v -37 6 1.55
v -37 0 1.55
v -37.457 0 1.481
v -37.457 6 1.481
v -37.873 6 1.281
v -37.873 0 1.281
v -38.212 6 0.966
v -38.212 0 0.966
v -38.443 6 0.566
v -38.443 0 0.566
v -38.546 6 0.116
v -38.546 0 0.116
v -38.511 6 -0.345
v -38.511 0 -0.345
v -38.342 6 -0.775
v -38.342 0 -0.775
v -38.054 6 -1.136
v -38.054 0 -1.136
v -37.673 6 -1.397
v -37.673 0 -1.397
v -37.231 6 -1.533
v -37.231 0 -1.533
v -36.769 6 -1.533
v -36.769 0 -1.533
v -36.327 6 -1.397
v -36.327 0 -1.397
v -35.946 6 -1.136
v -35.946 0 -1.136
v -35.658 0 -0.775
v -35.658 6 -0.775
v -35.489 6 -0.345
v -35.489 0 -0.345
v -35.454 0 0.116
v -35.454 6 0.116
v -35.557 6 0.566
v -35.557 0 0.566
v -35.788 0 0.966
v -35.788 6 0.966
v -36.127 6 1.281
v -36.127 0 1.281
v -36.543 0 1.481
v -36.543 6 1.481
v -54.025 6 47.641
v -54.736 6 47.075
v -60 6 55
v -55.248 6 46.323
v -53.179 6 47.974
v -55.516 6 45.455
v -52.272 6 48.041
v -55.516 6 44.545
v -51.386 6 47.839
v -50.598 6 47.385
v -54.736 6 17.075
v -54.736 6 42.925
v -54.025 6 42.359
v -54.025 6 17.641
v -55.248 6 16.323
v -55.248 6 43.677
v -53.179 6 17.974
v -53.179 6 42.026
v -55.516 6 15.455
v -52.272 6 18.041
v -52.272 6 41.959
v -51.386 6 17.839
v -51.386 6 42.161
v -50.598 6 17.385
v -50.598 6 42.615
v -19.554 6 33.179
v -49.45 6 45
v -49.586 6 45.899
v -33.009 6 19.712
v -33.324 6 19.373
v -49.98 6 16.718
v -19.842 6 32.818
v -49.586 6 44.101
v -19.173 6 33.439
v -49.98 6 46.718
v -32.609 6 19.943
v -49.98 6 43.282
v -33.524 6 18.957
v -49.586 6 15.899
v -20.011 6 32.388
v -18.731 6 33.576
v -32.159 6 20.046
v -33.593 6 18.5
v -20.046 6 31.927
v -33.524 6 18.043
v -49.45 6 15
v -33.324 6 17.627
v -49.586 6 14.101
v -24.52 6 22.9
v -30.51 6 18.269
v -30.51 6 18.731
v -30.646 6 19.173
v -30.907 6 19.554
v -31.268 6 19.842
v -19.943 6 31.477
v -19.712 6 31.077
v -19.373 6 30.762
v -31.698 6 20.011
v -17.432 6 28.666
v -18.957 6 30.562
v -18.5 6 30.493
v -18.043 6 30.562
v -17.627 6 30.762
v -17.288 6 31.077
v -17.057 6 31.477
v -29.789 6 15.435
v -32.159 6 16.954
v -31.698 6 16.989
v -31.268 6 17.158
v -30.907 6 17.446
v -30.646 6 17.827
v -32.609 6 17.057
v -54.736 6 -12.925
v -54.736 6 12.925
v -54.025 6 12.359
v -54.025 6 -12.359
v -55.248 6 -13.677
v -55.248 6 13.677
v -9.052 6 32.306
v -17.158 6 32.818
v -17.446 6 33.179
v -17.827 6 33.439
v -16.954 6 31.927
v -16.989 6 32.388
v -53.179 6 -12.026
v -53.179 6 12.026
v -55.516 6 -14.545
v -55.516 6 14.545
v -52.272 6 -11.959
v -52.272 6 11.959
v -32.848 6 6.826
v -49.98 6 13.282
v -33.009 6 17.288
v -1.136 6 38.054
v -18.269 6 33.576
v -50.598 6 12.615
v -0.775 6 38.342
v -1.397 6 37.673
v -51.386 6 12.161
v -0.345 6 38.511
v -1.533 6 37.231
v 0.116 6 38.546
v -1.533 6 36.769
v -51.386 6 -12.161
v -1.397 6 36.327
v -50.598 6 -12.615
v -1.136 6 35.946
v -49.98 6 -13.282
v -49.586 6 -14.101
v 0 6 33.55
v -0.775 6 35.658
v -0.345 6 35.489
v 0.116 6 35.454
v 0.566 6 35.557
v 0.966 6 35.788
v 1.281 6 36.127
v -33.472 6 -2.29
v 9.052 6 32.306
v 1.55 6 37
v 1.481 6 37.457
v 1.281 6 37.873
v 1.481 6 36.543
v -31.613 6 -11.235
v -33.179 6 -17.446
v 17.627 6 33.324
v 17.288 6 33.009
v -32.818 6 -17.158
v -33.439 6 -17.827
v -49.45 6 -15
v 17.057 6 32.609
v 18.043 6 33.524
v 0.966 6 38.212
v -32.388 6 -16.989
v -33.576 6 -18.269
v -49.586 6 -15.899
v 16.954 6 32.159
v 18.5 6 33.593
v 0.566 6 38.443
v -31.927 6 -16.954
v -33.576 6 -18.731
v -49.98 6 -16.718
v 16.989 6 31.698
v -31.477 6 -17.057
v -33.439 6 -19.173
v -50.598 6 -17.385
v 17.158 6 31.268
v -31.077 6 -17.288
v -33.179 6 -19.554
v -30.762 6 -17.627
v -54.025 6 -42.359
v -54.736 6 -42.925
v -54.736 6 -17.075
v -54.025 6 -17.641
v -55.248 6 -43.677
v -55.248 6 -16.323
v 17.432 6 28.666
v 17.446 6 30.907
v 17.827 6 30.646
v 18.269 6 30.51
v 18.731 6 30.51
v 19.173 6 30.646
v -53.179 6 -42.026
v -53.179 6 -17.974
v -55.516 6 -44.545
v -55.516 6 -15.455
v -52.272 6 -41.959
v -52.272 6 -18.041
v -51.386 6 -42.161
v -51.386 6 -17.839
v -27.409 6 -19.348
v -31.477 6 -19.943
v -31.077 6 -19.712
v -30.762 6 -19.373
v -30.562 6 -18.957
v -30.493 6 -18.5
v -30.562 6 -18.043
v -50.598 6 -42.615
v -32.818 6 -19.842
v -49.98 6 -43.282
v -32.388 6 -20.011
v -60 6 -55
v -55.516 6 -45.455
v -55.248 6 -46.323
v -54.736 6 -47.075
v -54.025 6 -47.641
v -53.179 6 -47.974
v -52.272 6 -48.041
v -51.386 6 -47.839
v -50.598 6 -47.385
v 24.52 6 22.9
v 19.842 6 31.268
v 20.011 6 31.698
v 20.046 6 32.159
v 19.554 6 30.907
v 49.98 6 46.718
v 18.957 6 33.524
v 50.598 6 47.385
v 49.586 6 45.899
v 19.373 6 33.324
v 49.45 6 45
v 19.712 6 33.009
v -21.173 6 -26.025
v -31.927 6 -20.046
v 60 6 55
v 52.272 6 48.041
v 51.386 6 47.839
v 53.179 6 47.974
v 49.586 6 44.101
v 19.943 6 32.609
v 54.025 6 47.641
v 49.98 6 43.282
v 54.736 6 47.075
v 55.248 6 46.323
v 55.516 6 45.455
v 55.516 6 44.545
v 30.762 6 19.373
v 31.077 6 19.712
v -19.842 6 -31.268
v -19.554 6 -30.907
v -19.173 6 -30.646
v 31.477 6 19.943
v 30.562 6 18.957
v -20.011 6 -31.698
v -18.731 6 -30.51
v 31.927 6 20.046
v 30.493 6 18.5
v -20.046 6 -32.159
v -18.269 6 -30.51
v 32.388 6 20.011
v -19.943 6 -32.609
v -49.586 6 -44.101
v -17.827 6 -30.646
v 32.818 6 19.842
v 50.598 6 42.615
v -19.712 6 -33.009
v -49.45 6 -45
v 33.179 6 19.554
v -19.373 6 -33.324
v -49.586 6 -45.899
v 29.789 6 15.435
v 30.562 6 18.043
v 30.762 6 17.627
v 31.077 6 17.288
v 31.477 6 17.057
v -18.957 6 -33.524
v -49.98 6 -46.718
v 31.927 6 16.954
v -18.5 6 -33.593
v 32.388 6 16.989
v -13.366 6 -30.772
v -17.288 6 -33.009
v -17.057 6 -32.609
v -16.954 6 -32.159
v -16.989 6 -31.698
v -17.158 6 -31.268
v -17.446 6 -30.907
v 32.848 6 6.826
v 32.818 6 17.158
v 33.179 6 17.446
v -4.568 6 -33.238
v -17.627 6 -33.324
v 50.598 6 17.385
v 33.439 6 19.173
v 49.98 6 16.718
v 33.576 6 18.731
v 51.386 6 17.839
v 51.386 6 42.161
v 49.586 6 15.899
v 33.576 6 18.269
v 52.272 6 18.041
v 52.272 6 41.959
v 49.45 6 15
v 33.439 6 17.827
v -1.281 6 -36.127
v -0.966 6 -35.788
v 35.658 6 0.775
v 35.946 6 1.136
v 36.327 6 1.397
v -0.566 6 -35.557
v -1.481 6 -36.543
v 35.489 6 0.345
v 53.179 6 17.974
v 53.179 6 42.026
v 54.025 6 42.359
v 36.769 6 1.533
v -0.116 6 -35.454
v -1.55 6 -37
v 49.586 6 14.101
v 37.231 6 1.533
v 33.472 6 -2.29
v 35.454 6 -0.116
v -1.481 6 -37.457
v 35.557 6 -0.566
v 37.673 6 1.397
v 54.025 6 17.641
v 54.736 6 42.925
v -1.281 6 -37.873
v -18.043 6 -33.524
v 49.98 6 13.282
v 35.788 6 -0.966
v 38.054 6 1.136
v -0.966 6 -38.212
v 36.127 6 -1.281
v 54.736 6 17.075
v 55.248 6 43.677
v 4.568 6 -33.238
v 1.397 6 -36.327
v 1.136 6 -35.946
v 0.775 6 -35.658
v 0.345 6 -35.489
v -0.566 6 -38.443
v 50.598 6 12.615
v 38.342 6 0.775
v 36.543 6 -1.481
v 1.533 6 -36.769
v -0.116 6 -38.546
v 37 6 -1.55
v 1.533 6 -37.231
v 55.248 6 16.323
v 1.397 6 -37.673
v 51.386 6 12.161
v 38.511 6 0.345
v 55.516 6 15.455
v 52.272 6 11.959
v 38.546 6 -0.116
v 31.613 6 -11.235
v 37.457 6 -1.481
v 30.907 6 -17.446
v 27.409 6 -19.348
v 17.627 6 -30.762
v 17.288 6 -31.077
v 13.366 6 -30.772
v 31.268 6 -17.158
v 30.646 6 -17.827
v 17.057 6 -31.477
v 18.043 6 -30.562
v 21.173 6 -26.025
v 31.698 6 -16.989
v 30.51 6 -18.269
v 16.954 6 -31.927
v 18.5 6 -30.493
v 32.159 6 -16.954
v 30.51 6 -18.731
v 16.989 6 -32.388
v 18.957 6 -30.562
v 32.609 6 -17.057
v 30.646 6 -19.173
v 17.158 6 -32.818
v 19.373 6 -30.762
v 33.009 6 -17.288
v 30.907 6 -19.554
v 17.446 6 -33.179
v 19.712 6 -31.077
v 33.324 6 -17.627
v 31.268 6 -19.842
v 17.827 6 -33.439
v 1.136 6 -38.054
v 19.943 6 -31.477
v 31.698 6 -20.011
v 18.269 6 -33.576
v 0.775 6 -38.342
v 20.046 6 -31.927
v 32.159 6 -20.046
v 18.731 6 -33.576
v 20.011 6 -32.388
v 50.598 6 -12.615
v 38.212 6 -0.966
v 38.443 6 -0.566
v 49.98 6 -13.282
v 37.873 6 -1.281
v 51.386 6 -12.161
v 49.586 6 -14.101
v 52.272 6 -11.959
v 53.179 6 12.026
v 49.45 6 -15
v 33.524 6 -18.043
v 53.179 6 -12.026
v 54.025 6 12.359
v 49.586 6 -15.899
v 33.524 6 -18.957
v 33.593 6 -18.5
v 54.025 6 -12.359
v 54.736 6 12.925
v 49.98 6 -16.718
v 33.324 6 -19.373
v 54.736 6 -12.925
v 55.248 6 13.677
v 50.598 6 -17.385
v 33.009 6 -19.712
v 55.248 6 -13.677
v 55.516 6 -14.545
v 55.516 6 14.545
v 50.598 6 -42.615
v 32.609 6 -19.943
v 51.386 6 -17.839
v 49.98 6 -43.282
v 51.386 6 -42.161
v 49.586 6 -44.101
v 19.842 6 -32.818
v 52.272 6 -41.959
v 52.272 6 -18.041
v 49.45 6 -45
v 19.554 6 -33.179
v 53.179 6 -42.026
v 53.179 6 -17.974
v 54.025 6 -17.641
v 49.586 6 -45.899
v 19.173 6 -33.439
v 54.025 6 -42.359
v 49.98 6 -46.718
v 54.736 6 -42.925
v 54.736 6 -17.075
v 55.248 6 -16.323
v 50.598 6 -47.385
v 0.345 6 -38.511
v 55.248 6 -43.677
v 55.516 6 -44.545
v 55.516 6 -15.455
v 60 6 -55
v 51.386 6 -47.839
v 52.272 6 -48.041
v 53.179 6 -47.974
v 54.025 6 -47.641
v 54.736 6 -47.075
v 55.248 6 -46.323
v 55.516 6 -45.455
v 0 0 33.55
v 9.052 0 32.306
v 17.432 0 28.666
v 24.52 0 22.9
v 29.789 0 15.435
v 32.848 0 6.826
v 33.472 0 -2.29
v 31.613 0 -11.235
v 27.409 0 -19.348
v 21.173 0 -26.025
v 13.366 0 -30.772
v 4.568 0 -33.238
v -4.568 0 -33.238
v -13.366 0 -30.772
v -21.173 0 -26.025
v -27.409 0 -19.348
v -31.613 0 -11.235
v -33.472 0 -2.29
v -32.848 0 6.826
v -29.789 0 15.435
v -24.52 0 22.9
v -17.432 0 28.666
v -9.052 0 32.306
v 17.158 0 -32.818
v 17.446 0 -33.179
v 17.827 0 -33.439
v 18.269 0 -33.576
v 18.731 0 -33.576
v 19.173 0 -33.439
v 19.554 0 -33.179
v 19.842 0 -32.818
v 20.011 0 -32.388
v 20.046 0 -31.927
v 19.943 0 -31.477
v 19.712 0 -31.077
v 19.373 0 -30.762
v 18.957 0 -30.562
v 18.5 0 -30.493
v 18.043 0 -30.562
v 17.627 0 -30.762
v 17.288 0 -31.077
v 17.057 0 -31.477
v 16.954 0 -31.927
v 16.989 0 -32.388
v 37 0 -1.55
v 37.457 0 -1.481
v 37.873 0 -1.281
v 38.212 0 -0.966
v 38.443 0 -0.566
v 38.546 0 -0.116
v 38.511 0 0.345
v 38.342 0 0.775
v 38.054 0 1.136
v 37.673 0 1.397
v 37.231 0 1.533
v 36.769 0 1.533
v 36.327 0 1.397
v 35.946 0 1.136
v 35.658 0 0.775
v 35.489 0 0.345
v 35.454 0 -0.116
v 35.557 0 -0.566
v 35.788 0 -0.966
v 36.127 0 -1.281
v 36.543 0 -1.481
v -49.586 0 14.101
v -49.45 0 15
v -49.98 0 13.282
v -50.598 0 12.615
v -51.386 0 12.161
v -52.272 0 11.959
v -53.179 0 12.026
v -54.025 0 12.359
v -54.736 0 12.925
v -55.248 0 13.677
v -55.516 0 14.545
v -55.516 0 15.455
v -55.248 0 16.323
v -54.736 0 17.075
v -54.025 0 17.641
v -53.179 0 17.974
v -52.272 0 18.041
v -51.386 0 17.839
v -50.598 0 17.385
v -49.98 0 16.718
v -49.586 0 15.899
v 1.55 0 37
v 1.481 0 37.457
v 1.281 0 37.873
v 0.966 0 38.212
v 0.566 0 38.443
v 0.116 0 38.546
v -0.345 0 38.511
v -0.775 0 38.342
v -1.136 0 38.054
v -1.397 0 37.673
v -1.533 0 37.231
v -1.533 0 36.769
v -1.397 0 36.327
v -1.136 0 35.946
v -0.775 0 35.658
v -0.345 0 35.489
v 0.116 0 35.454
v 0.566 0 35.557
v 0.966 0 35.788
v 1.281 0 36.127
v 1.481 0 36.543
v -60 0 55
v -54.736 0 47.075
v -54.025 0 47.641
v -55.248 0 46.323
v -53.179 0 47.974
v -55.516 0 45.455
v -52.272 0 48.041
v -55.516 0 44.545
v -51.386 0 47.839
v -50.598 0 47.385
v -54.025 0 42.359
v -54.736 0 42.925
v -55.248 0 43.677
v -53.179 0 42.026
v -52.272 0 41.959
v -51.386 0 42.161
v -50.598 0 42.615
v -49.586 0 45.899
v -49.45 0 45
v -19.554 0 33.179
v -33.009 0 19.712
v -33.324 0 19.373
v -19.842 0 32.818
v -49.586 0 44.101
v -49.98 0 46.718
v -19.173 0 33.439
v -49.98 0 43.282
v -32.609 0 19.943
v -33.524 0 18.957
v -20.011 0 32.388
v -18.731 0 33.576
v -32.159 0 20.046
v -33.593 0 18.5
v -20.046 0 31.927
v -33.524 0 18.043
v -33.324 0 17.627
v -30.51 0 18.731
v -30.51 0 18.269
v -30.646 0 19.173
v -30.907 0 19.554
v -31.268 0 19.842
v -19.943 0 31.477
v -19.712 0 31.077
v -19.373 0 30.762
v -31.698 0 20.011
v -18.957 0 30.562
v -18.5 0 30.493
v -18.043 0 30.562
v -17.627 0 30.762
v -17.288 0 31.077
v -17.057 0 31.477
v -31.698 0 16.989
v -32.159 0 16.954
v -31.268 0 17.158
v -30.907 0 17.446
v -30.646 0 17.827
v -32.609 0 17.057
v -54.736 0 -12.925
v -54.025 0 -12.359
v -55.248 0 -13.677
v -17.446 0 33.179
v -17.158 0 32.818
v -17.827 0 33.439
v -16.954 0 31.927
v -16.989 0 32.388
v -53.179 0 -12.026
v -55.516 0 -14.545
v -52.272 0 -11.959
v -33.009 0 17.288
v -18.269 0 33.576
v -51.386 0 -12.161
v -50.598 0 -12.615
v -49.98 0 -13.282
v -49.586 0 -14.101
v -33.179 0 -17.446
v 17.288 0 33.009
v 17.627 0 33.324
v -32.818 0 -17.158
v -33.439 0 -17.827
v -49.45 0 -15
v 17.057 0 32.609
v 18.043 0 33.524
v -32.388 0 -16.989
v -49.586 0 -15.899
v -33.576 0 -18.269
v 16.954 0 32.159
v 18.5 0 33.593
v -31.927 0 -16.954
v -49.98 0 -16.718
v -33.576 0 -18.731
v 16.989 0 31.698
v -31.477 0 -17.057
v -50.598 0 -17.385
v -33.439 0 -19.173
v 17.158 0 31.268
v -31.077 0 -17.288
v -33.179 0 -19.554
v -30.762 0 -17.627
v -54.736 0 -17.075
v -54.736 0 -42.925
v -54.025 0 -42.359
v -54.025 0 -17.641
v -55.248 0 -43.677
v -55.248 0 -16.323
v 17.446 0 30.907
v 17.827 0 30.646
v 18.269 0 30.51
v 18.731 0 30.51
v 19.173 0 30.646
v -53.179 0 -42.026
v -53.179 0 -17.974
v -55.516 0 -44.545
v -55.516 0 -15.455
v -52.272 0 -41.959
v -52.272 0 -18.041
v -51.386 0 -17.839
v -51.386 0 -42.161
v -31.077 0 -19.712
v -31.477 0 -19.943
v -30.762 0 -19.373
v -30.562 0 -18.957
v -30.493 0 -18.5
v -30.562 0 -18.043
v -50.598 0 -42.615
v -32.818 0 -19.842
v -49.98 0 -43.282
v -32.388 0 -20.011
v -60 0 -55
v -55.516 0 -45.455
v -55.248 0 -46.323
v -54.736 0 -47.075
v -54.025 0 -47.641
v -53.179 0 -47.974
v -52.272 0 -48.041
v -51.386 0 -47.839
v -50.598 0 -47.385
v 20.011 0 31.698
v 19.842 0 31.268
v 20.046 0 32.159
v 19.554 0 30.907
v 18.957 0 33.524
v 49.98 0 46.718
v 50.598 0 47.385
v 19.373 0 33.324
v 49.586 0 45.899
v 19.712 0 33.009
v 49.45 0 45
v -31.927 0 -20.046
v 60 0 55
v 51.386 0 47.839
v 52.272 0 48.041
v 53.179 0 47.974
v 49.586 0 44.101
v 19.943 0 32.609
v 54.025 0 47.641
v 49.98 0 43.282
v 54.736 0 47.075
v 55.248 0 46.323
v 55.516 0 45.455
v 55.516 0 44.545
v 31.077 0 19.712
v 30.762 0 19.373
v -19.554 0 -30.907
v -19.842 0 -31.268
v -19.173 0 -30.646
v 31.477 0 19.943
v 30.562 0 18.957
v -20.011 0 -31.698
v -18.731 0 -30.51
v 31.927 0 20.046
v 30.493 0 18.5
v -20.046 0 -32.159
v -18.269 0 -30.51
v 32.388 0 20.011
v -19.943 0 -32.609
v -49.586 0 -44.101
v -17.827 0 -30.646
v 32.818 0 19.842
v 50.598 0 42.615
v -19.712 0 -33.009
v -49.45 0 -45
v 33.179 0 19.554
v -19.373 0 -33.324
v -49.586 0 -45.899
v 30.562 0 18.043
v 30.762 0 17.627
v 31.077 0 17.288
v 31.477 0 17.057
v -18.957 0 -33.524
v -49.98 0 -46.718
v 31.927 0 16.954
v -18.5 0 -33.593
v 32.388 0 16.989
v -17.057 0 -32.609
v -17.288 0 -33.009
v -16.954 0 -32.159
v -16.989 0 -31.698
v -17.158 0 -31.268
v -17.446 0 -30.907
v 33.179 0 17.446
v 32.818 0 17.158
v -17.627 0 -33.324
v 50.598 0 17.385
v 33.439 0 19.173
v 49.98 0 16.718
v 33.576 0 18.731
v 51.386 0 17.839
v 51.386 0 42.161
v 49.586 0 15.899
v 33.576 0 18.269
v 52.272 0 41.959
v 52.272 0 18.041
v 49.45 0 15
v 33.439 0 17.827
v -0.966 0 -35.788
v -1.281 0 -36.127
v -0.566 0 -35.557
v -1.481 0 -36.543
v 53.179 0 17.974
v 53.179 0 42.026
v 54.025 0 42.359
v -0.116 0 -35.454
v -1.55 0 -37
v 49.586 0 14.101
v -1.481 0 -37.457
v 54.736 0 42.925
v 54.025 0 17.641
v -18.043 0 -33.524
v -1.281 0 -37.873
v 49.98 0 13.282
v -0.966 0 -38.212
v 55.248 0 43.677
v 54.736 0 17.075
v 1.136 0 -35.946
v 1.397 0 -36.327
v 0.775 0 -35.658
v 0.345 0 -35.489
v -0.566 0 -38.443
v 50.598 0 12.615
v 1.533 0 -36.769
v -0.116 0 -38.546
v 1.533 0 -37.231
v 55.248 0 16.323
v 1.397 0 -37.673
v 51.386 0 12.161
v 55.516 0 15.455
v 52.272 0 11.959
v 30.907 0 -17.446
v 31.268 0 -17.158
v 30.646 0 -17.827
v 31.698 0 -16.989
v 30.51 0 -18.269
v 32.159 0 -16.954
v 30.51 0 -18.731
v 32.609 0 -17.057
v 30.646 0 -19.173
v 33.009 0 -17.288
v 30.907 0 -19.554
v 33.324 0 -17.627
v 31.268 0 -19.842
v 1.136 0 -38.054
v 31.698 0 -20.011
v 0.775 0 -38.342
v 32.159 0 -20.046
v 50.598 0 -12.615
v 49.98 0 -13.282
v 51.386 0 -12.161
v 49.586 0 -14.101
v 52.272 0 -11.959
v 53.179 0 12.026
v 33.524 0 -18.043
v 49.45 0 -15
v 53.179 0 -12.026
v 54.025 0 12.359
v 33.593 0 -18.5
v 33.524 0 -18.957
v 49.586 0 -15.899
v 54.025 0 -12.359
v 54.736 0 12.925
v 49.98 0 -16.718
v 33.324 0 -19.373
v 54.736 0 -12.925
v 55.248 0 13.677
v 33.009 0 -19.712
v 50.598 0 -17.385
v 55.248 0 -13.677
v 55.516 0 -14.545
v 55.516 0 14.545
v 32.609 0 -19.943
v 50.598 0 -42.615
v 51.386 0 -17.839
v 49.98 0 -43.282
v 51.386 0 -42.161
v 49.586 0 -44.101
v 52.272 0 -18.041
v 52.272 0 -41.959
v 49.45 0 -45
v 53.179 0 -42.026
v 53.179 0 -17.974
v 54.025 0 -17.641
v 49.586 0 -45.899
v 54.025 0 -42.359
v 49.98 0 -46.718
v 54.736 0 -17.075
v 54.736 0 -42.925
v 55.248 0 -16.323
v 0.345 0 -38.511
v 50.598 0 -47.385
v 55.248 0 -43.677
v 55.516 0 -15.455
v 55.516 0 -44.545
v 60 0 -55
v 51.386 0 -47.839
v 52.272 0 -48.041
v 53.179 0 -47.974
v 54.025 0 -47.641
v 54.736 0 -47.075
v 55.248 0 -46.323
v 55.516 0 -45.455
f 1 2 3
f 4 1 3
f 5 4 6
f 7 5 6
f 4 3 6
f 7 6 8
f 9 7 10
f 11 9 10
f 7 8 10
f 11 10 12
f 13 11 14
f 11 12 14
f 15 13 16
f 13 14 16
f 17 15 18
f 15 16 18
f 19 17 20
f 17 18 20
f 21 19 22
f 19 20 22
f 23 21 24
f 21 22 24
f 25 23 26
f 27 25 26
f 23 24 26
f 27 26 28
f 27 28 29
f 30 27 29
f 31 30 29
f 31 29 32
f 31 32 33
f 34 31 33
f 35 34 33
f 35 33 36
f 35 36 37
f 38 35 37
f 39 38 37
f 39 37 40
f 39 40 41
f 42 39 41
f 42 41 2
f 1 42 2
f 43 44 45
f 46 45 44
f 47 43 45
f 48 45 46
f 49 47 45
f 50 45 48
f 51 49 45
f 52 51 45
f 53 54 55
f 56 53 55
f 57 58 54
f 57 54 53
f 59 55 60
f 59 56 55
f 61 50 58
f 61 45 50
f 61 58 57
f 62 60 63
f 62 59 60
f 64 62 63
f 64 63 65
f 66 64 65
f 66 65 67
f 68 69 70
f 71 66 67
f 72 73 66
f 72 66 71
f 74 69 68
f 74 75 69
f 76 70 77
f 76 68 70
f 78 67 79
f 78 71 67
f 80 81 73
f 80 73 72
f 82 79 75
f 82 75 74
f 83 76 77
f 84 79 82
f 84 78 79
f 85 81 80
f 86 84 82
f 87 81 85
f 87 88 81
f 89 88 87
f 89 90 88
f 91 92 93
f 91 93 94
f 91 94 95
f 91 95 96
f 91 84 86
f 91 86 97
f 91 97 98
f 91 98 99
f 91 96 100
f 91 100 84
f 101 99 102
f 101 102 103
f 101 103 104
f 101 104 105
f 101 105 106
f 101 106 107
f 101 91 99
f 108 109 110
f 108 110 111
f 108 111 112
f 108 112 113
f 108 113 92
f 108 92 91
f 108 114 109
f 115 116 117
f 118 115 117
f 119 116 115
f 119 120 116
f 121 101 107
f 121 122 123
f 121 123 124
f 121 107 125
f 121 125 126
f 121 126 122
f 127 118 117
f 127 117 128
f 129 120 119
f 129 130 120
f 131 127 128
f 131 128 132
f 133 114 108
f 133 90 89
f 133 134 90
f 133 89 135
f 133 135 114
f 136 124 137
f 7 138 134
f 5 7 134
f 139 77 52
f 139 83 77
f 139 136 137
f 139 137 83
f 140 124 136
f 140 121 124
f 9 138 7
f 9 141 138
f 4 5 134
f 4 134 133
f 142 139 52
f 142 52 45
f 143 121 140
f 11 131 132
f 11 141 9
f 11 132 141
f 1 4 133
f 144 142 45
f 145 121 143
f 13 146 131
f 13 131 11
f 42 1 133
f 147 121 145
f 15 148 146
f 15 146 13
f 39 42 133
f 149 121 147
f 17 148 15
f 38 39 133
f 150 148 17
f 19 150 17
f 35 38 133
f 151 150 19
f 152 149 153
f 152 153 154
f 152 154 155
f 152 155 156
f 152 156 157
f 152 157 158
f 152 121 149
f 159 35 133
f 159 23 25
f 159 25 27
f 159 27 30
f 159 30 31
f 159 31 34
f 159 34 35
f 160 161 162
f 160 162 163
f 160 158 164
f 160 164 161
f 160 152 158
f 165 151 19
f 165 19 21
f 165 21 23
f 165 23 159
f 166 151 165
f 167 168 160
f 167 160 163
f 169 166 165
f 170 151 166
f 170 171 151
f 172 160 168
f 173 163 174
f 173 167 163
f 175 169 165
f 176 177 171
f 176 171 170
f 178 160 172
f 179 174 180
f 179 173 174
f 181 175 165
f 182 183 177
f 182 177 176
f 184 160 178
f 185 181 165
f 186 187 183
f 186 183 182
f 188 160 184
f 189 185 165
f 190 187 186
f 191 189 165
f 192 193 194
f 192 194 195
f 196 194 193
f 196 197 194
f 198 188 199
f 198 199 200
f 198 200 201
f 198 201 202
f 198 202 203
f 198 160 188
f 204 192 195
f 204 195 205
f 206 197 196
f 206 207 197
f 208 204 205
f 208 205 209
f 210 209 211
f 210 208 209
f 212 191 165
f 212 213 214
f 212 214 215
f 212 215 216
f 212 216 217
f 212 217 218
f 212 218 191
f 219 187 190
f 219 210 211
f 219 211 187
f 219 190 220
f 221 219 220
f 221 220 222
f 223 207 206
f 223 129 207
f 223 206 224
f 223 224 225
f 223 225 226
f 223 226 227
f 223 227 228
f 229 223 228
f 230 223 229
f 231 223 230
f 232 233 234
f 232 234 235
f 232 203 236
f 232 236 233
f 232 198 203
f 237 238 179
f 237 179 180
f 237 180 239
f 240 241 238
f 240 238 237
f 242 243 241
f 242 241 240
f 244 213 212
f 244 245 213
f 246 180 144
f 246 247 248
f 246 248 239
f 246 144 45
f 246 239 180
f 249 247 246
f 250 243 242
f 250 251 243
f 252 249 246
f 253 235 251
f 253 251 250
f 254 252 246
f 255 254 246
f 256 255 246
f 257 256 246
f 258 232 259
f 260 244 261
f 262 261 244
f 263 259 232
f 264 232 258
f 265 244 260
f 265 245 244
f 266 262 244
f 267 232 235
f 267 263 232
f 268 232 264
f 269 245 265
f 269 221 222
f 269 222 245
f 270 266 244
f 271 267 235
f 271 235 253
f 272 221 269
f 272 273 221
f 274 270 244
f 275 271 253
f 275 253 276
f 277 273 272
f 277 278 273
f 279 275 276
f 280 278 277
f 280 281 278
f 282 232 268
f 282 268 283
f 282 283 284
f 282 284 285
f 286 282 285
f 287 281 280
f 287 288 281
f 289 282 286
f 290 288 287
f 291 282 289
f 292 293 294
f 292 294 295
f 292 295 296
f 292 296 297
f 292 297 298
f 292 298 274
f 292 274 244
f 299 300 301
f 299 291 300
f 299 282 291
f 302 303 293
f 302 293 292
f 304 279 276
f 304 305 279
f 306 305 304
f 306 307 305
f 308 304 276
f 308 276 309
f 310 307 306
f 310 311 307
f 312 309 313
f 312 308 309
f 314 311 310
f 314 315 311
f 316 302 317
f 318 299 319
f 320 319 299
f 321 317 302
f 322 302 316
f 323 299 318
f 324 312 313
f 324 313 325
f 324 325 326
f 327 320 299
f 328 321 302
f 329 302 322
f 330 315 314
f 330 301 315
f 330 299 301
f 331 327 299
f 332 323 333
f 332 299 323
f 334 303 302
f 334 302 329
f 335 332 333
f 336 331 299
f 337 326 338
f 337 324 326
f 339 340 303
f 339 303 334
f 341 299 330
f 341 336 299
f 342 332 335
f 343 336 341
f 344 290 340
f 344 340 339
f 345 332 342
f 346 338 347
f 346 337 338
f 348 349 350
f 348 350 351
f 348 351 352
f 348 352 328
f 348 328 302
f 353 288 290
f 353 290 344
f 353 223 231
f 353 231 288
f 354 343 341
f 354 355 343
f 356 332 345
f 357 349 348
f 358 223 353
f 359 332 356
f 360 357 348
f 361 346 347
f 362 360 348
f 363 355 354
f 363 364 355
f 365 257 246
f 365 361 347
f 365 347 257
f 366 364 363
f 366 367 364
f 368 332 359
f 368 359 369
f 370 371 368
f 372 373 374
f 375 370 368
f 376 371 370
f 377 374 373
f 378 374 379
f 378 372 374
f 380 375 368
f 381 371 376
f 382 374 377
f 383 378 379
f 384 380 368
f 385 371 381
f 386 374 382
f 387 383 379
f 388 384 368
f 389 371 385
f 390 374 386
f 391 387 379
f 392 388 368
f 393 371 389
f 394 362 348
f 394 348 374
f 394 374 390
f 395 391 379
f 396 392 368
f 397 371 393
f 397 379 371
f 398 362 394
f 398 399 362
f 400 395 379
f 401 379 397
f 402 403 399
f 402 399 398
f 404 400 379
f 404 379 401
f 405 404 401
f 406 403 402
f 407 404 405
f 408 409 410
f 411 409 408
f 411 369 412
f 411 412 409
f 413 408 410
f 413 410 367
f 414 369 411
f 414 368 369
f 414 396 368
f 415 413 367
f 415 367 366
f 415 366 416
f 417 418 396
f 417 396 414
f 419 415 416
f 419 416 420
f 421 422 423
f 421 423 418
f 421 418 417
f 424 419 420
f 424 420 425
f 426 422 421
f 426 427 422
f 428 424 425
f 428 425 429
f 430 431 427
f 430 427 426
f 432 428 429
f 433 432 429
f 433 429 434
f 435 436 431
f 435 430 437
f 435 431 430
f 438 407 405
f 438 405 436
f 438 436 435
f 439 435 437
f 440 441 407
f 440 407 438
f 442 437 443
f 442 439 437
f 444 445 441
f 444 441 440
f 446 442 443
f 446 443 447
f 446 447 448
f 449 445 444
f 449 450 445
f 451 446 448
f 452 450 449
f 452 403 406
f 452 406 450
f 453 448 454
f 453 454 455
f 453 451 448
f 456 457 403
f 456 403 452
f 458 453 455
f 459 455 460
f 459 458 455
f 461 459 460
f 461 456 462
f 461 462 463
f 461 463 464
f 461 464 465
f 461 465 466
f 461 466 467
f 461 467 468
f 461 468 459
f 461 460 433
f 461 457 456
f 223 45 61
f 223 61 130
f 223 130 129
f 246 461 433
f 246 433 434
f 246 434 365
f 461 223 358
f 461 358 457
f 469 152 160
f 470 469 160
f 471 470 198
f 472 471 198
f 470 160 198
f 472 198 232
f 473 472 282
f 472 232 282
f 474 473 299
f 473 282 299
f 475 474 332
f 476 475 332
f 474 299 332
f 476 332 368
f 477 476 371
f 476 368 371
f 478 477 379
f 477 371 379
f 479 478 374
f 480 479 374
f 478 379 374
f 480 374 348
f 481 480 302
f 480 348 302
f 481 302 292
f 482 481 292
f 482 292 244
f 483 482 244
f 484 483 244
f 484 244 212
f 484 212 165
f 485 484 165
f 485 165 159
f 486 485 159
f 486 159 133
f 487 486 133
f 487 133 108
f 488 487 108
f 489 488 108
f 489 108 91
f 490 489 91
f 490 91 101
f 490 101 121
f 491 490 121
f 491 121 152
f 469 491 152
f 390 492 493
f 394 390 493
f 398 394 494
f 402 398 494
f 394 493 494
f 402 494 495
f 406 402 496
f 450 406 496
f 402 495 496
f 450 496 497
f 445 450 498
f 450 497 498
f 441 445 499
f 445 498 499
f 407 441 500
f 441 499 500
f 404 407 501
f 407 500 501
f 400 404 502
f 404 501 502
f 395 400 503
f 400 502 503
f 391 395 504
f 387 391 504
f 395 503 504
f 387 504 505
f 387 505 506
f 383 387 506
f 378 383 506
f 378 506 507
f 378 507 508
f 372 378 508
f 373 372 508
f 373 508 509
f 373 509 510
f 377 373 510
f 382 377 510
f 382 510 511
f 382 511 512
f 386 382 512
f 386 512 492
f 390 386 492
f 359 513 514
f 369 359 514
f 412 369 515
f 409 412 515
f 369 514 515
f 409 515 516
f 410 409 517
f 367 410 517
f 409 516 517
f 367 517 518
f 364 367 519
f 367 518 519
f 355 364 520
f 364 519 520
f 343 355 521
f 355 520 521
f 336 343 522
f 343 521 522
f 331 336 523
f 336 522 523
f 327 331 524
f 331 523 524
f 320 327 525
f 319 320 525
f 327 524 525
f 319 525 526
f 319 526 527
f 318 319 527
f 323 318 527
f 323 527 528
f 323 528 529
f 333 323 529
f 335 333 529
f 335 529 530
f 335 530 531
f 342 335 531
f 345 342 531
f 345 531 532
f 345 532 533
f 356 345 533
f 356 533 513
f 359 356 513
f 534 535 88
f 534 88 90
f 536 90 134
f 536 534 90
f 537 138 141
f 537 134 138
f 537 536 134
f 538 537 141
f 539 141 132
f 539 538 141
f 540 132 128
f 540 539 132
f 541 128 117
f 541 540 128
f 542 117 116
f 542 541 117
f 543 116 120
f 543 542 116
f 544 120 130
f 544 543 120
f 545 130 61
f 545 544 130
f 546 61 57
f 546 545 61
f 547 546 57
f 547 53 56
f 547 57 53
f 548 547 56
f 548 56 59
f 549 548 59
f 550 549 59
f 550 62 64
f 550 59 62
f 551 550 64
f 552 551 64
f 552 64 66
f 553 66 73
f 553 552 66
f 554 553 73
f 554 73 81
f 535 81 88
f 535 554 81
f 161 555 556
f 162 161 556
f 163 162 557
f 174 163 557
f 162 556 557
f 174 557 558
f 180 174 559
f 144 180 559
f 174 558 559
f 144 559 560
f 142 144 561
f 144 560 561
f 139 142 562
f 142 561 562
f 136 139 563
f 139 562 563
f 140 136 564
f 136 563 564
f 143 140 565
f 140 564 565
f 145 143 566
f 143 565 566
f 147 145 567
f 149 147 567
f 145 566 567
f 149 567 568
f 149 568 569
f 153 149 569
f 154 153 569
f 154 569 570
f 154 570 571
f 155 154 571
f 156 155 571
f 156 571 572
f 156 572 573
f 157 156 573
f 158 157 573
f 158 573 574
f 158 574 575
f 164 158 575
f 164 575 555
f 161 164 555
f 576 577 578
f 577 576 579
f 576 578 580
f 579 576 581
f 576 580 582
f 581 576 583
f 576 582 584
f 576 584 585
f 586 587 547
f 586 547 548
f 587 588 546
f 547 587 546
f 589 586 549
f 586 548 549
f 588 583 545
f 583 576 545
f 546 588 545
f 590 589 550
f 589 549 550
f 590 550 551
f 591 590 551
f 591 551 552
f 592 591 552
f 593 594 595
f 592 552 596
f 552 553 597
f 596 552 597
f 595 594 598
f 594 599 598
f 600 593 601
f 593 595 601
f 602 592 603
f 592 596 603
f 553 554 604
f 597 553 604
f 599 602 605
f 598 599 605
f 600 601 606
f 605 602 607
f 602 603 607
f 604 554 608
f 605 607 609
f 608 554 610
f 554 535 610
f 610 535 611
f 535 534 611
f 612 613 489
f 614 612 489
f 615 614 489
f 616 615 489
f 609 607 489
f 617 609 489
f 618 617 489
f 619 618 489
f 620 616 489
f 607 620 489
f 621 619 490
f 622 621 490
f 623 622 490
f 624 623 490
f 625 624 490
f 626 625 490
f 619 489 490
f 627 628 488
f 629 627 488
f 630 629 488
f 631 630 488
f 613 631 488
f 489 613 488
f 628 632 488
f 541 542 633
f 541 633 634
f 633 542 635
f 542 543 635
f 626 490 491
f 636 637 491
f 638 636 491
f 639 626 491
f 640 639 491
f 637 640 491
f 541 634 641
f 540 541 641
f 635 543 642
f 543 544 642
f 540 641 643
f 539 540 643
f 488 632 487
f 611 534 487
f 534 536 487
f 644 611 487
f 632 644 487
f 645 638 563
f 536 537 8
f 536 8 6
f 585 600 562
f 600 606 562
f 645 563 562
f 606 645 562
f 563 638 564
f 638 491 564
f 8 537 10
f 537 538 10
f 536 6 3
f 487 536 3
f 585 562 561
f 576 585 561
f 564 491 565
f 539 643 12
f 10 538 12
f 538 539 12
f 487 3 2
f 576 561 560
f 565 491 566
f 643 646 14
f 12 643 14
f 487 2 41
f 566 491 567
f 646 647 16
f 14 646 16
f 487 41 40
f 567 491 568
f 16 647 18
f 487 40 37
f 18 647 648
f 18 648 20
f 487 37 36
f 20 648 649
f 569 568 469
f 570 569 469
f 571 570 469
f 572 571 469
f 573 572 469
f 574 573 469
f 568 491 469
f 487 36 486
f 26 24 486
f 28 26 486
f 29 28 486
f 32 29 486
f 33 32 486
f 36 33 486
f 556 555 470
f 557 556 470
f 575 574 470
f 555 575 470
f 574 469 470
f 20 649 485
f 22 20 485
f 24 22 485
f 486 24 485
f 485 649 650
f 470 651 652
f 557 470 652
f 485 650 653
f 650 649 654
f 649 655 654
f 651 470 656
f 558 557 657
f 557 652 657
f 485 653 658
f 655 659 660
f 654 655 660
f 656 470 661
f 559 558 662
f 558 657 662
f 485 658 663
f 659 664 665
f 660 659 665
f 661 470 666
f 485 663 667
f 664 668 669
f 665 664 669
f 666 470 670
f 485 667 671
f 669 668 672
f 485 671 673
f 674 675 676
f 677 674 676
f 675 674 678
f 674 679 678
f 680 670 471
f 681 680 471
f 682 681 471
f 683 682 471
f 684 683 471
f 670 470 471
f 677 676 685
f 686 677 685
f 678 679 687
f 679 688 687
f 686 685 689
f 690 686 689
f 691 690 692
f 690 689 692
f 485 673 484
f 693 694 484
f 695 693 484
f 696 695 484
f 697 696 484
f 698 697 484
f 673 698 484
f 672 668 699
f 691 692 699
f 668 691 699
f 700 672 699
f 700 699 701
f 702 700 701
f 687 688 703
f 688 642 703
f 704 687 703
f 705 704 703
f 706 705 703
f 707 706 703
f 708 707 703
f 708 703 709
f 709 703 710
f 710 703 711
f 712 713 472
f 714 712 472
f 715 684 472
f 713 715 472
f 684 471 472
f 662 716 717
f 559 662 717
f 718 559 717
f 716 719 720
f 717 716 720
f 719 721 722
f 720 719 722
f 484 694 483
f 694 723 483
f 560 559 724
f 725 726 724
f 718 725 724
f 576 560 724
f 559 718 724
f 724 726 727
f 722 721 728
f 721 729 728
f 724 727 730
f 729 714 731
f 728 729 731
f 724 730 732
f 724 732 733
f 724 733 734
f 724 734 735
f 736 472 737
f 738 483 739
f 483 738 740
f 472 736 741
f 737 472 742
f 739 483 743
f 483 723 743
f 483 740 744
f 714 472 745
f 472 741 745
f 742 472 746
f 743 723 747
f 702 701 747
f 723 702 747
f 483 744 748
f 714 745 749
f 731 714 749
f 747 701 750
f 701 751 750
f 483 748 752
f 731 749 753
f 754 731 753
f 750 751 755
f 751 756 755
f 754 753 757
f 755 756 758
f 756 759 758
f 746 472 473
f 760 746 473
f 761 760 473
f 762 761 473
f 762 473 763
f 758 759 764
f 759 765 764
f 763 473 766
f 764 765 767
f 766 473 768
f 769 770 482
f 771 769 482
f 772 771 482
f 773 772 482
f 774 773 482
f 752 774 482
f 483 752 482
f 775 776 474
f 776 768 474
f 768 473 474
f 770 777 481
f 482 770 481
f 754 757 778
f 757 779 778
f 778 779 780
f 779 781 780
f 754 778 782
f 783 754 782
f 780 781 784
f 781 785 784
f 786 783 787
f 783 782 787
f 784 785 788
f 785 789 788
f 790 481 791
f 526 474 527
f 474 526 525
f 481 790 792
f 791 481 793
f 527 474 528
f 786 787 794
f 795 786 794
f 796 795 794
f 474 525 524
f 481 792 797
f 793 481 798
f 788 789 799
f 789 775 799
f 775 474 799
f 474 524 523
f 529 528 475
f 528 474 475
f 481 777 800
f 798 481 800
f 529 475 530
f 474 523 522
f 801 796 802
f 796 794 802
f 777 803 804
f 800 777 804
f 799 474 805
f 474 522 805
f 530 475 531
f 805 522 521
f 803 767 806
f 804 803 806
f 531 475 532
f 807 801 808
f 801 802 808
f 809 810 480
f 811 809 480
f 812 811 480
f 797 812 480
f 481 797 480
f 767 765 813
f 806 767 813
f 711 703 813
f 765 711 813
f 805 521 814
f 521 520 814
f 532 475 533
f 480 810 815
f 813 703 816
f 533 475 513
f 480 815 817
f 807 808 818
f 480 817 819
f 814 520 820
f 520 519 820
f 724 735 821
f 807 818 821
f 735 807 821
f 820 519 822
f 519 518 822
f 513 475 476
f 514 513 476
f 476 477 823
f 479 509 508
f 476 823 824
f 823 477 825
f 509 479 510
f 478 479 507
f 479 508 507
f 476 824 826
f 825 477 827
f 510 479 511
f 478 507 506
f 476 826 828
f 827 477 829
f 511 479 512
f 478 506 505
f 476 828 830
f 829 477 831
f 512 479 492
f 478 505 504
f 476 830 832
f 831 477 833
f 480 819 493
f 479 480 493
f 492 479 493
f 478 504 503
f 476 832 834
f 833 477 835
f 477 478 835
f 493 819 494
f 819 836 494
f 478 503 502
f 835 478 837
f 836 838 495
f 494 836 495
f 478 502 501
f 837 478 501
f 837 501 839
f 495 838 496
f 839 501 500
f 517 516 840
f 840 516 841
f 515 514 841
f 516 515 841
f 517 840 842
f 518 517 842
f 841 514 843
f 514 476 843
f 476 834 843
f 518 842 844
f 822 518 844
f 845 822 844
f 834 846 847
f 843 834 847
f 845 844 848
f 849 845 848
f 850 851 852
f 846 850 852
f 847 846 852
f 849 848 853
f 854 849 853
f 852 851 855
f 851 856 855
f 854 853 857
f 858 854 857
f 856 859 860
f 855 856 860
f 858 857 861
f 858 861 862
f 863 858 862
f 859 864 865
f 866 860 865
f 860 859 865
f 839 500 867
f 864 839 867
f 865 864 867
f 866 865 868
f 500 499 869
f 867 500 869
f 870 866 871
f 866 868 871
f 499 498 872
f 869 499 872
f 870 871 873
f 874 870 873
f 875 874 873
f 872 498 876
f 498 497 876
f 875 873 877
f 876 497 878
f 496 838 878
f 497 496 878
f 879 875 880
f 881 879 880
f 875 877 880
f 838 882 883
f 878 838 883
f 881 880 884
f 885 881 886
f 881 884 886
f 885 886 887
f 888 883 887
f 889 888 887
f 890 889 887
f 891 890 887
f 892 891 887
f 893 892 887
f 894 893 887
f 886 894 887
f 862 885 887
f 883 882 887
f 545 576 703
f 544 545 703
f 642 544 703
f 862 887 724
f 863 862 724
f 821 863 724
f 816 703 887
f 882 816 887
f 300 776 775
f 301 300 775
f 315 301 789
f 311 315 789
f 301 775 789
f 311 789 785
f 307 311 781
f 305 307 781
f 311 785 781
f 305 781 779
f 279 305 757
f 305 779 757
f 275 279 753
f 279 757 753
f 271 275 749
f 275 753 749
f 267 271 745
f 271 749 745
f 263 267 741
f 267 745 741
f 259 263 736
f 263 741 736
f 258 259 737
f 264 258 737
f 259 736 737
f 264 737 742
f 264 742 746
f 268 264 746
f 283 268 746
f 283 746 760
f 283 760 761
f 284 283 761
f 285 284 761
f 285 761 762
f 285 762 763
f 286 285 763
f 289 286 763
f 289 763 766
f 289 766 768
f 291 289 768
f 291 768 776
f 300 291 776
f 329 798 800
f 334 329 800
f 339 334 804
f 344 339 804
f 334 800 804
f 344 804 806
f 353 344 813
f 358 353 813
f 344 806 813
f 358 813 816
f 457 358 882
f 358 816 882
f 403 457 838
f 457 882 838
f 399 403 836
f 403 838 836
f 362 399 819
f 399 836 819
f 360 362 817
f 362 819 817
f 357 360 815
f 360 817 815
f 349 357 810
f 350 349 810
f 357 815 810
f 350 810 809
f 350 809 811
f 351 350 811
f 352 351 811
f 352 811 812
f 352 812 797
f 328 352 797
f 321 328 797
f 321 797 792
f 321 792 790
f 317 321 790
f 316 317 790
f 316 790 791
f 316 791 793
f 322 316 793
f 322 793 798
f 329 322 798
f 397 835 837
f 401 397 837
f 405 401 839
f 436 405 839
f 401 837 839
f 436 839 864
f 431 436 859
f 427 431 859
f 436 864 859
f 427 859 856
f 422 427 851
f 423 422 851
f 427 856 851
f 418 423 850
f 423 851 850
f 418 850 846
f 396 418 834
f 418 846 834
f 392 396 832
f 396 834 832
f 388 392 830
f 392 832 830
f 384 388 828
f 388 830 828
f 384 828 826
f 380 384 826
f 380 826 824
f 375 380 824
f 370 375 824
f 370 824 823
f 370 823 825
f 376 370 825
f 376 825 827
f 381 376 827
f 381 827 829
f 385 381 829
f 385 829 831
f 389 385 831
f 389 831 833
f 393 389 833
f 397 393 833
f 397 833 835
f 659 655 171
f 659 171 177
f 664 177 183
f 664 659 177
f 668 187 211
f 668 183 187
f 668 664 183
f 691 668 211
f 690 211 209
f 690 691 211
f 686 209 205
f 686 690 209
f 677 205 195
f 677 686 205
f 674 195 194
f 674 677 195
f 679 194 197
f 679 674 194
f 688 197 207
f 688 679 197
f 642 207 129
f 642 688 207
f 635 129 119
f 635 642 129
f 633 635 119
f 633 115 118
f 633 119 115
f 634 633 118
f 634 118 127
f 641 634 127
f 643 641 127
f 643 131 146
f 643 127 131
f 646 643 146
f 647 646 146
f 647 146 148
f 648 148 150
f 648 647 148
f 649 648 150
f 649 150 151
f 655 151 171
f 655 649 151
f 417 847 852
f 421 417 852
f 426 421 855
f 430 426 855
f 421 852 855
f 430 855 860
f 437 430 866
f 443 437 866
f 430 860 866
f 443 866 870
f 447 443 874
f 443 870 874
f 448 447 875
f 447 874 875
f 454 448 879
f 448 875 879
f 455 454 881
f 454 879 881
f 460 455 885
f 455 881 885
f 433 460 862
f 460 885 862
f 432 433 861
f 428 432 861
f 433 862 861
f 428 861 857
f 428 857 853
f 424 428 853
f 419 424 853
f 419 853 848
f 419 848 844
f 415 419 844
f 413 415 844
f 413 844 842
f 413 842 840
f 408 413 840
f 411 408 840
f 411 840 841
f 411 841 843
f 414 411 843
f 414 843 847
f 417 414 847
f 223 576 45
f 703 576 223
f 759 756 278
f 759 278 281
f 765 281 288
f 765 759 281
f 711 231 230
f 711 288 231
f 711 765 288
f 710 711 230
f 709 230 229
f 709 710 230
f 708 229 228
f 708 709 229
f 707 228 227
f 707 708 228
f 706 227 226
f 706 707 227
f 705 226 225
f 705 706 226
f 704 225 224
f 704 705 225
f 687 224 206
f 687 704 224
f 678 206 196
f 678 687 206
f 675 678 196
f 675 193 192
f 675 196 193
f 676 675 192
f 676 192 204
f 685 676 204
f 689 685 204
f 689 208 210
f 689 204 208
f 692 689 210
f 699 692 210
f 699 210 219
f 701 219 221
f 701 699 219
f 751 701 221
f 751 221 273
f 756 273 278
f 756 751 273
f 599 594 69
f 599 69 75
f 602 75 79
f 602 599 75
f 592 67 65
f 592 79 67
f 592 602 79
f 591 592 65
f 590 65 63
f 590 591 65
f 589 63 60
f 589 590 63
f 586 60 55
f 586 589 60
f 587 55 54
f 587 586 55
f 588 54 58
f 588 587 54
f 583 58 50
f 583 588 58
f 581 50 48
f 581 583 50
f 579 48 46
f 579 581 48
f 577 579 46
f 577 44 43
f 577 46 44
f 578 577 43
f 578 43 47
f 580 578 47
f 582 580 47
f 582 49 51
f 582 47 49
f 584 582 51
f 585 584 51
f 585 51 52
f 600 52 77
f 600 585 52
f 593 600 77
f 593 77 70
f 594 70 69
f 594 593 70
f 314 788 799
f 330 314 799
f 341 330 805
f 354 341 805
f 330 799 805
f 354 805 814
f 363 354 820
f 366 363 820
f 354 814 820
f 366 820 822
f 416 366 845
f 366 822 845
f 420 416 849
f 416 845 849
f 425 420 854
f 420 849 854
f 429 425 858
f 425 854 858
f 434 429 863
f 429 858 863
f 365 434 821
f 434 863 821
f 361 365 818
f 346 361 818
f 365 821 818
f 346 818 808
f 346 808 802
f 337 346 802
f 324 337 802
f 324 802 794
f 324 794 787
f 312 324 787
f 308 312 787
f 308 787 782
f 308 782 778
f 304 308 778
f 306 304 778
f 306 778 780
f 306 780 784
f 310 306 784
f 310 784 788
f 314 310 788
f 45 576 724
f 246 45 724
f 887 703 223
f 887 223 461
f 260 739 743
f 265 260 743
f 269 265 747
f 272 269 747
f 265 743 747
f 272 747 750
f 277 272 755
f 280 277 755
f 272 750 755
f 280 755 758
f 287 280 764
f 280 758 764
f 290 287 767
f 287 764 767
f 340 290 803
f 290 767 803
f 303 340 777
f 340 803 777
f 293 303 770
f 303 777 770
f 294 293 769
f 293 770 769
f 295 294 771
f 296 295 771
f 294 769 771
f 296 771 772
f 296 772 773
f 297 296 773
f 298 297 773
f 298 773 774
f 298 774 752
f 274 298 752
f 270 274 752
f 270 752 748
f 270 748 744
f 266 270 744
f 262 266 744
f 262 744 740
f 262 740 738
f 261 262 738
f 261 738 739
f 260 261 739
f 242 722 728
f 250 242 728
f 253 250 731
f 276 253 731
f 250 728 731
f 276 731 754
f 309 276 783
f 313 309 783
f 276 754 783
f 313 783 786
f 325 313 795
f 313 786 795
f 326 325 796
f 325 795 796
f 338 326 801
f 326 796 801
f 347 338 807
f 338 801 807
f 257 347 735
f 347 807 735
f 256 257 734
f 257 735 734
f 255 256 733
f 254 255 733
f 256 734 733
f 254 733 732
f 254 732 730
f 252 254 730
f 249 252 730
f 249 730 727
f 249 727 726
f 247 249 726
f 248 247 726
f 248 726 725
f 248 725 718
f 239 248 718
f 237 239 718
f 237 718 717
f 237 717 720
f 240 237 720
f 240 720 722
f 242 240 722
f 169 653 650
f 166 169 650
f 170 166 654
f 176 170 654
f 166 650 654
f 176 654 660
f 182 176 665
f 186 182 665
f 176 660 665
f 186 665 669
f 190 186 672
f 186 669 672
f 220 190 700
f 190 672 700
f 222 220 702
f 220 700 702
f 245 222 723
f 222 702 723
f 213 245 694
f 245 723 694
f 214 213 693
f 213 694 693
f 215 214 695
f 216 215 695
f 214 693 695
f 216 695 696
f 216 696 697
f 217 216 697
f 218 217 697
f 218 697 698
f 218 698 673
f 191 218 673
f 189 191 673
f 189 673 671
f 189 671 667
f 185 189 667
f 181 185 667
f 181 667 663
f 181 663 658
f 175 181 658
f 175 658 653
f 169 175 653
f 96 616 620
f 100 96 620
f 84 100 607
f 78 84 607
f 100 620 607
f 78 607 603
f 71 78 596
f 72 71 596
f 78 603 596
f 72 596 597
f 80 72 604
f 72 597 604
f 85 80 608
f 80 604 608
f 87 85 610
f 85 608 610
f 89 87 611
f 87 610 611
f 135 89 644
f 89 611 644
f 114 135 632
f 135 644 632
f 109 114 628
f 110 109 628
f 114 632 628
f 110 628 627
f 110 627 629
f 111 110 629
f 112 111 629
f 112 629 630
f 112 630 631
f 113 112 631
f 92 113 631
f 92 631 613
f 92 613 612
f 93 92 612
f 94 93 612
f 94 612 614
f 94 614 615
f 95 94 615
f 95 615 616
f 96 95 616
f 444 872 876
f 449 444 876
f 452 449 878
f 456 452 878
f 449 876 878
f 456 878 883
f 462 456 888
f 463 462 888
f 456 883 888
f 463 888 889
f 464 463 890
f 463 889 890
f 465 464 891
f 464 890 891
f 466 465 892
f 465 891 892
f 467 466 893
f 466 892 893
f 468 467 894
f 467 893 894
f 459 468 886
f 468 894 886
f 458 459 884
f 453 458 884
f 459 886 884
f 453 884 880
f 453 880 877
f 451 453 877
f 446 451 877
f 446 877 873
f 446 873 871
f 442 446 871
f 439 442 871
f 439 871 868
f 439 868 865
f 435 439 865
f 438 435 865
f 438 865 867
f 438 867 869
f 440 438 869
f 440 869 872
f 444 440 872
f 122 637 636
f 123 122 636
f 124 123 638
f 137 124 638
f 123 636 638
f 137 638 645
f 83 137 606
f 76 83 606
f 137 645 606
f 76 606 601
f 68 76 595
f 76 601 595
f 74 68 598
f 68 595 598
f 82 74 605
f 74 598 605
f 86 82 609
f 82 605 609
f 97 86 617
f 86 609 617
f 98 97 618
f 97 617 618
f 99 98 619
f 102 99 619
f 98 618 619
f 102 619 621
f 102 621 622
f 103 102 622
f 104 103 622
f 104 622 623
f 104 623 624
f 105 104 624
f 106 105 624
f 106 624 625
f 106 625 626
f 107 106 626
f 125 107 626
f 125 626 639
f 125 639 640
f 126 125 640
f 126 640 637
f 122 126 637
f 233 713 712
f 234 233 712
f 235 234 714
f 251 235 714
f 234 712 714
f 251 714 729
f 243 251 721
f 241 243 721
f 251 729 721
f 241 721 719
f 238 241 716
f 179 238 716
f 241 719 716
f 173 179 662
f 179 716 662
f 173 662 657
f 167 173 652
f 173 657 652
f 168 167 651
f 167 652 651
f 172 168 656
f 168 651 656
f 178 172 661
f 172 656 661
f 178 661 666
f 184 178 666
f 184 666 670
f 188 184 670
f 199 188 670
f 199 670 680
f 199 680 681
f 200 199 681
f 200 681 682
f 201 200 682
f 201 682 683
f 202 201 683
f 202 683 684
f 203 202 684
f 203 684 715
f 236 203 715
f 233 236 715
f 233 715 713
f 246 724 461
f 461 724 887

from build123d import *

# Parameters (mm, degrees)
SKETCH1_W            = 120
SKETCH1_H            = 110
BOSS_EXTRUDE1_DEPTH  = 6
SKETCH2_R            = 33.55
CUT_EXTRUDE1_DEPTH   = 82.614949611
M3_CLEARANCE_HOLE1_D = 3.1
CIRPATTERN1_COUNT    = 12
M6_CLEARANCE_HOLE2_D = 6.1


with BuildPart() as part:
    # Sketch1 → Boss-Extrude1 (new body)
    with BuildSketch(Plane(origin=(0, 0, 0), x_dir=(1, 0, 0), z_dir=(0, 1, 0))):
        Rectangle(SKETCH1_W, SKETCH1_H)
    extrude(amount=BOSS_EXTRUDE1_DEPTH)

    # Sketch2 → Cut-Extrude1 (cut, through all)
    with BuildSketch(Plane(origin=(0, 6, 0), x_dir=(1, 0, 0), z_dir=(0, 1, 0))):
        with Locations(Location((0, 0, 0), (0, 0, 270))):
            Circle(SKETCH2_R)
    extrude(amount=-CUT_EXTRUDE1_DEPTH, mode=Mode.SUBTRACT)

    # M3 Clearance Hole1 (through all)
    with Locations(Plane(origin=(0, 6, 0), x_dir=(1, 0, 0), z_dir=(0, 1, 0))):
        with Locations((0, 37)):
            m3_clearance_hole1 = Hole(M3_CLEARANCE_HOLE1_D / 2)

    # CirPattern1: M3 Clearance Hole1 ×12 about axis
    cirpattern1_axis = Axis((0, 0, 0), (0, 1, 0))
    for i in range(1, CIRPATTERN1_COUNT):
        add(m3_clearance_hole1.rotate(cirpattern1_axis, i * 360 / CIRPATTERN1_COUNT), mode=Mode.SUBTRACT)

    # M6 Clearance Hole2 (through all)
    with Locations(Plane(origin=(0, 6, 0), x_dir=(1, 0, 0), z_dir=(0, 1, 0))):
        with Locations((52.5, -45), (52.5, -15), (52.5, 15), (52.5, 45)):
            m6_clearance_hole2 = Hole(M6_CLEARANCE_HOLE2_D / 2)

    # Mirror1: M6 Clearance Hole2 across plane
    add(m6_clearance_hole2.mirror(Plane(origin=(0, 0, 0), x_dir=(0, 0, 1), z_dir=(1, 0, 0))), mode=Mode.SUBTRACT)


solid = part.part
